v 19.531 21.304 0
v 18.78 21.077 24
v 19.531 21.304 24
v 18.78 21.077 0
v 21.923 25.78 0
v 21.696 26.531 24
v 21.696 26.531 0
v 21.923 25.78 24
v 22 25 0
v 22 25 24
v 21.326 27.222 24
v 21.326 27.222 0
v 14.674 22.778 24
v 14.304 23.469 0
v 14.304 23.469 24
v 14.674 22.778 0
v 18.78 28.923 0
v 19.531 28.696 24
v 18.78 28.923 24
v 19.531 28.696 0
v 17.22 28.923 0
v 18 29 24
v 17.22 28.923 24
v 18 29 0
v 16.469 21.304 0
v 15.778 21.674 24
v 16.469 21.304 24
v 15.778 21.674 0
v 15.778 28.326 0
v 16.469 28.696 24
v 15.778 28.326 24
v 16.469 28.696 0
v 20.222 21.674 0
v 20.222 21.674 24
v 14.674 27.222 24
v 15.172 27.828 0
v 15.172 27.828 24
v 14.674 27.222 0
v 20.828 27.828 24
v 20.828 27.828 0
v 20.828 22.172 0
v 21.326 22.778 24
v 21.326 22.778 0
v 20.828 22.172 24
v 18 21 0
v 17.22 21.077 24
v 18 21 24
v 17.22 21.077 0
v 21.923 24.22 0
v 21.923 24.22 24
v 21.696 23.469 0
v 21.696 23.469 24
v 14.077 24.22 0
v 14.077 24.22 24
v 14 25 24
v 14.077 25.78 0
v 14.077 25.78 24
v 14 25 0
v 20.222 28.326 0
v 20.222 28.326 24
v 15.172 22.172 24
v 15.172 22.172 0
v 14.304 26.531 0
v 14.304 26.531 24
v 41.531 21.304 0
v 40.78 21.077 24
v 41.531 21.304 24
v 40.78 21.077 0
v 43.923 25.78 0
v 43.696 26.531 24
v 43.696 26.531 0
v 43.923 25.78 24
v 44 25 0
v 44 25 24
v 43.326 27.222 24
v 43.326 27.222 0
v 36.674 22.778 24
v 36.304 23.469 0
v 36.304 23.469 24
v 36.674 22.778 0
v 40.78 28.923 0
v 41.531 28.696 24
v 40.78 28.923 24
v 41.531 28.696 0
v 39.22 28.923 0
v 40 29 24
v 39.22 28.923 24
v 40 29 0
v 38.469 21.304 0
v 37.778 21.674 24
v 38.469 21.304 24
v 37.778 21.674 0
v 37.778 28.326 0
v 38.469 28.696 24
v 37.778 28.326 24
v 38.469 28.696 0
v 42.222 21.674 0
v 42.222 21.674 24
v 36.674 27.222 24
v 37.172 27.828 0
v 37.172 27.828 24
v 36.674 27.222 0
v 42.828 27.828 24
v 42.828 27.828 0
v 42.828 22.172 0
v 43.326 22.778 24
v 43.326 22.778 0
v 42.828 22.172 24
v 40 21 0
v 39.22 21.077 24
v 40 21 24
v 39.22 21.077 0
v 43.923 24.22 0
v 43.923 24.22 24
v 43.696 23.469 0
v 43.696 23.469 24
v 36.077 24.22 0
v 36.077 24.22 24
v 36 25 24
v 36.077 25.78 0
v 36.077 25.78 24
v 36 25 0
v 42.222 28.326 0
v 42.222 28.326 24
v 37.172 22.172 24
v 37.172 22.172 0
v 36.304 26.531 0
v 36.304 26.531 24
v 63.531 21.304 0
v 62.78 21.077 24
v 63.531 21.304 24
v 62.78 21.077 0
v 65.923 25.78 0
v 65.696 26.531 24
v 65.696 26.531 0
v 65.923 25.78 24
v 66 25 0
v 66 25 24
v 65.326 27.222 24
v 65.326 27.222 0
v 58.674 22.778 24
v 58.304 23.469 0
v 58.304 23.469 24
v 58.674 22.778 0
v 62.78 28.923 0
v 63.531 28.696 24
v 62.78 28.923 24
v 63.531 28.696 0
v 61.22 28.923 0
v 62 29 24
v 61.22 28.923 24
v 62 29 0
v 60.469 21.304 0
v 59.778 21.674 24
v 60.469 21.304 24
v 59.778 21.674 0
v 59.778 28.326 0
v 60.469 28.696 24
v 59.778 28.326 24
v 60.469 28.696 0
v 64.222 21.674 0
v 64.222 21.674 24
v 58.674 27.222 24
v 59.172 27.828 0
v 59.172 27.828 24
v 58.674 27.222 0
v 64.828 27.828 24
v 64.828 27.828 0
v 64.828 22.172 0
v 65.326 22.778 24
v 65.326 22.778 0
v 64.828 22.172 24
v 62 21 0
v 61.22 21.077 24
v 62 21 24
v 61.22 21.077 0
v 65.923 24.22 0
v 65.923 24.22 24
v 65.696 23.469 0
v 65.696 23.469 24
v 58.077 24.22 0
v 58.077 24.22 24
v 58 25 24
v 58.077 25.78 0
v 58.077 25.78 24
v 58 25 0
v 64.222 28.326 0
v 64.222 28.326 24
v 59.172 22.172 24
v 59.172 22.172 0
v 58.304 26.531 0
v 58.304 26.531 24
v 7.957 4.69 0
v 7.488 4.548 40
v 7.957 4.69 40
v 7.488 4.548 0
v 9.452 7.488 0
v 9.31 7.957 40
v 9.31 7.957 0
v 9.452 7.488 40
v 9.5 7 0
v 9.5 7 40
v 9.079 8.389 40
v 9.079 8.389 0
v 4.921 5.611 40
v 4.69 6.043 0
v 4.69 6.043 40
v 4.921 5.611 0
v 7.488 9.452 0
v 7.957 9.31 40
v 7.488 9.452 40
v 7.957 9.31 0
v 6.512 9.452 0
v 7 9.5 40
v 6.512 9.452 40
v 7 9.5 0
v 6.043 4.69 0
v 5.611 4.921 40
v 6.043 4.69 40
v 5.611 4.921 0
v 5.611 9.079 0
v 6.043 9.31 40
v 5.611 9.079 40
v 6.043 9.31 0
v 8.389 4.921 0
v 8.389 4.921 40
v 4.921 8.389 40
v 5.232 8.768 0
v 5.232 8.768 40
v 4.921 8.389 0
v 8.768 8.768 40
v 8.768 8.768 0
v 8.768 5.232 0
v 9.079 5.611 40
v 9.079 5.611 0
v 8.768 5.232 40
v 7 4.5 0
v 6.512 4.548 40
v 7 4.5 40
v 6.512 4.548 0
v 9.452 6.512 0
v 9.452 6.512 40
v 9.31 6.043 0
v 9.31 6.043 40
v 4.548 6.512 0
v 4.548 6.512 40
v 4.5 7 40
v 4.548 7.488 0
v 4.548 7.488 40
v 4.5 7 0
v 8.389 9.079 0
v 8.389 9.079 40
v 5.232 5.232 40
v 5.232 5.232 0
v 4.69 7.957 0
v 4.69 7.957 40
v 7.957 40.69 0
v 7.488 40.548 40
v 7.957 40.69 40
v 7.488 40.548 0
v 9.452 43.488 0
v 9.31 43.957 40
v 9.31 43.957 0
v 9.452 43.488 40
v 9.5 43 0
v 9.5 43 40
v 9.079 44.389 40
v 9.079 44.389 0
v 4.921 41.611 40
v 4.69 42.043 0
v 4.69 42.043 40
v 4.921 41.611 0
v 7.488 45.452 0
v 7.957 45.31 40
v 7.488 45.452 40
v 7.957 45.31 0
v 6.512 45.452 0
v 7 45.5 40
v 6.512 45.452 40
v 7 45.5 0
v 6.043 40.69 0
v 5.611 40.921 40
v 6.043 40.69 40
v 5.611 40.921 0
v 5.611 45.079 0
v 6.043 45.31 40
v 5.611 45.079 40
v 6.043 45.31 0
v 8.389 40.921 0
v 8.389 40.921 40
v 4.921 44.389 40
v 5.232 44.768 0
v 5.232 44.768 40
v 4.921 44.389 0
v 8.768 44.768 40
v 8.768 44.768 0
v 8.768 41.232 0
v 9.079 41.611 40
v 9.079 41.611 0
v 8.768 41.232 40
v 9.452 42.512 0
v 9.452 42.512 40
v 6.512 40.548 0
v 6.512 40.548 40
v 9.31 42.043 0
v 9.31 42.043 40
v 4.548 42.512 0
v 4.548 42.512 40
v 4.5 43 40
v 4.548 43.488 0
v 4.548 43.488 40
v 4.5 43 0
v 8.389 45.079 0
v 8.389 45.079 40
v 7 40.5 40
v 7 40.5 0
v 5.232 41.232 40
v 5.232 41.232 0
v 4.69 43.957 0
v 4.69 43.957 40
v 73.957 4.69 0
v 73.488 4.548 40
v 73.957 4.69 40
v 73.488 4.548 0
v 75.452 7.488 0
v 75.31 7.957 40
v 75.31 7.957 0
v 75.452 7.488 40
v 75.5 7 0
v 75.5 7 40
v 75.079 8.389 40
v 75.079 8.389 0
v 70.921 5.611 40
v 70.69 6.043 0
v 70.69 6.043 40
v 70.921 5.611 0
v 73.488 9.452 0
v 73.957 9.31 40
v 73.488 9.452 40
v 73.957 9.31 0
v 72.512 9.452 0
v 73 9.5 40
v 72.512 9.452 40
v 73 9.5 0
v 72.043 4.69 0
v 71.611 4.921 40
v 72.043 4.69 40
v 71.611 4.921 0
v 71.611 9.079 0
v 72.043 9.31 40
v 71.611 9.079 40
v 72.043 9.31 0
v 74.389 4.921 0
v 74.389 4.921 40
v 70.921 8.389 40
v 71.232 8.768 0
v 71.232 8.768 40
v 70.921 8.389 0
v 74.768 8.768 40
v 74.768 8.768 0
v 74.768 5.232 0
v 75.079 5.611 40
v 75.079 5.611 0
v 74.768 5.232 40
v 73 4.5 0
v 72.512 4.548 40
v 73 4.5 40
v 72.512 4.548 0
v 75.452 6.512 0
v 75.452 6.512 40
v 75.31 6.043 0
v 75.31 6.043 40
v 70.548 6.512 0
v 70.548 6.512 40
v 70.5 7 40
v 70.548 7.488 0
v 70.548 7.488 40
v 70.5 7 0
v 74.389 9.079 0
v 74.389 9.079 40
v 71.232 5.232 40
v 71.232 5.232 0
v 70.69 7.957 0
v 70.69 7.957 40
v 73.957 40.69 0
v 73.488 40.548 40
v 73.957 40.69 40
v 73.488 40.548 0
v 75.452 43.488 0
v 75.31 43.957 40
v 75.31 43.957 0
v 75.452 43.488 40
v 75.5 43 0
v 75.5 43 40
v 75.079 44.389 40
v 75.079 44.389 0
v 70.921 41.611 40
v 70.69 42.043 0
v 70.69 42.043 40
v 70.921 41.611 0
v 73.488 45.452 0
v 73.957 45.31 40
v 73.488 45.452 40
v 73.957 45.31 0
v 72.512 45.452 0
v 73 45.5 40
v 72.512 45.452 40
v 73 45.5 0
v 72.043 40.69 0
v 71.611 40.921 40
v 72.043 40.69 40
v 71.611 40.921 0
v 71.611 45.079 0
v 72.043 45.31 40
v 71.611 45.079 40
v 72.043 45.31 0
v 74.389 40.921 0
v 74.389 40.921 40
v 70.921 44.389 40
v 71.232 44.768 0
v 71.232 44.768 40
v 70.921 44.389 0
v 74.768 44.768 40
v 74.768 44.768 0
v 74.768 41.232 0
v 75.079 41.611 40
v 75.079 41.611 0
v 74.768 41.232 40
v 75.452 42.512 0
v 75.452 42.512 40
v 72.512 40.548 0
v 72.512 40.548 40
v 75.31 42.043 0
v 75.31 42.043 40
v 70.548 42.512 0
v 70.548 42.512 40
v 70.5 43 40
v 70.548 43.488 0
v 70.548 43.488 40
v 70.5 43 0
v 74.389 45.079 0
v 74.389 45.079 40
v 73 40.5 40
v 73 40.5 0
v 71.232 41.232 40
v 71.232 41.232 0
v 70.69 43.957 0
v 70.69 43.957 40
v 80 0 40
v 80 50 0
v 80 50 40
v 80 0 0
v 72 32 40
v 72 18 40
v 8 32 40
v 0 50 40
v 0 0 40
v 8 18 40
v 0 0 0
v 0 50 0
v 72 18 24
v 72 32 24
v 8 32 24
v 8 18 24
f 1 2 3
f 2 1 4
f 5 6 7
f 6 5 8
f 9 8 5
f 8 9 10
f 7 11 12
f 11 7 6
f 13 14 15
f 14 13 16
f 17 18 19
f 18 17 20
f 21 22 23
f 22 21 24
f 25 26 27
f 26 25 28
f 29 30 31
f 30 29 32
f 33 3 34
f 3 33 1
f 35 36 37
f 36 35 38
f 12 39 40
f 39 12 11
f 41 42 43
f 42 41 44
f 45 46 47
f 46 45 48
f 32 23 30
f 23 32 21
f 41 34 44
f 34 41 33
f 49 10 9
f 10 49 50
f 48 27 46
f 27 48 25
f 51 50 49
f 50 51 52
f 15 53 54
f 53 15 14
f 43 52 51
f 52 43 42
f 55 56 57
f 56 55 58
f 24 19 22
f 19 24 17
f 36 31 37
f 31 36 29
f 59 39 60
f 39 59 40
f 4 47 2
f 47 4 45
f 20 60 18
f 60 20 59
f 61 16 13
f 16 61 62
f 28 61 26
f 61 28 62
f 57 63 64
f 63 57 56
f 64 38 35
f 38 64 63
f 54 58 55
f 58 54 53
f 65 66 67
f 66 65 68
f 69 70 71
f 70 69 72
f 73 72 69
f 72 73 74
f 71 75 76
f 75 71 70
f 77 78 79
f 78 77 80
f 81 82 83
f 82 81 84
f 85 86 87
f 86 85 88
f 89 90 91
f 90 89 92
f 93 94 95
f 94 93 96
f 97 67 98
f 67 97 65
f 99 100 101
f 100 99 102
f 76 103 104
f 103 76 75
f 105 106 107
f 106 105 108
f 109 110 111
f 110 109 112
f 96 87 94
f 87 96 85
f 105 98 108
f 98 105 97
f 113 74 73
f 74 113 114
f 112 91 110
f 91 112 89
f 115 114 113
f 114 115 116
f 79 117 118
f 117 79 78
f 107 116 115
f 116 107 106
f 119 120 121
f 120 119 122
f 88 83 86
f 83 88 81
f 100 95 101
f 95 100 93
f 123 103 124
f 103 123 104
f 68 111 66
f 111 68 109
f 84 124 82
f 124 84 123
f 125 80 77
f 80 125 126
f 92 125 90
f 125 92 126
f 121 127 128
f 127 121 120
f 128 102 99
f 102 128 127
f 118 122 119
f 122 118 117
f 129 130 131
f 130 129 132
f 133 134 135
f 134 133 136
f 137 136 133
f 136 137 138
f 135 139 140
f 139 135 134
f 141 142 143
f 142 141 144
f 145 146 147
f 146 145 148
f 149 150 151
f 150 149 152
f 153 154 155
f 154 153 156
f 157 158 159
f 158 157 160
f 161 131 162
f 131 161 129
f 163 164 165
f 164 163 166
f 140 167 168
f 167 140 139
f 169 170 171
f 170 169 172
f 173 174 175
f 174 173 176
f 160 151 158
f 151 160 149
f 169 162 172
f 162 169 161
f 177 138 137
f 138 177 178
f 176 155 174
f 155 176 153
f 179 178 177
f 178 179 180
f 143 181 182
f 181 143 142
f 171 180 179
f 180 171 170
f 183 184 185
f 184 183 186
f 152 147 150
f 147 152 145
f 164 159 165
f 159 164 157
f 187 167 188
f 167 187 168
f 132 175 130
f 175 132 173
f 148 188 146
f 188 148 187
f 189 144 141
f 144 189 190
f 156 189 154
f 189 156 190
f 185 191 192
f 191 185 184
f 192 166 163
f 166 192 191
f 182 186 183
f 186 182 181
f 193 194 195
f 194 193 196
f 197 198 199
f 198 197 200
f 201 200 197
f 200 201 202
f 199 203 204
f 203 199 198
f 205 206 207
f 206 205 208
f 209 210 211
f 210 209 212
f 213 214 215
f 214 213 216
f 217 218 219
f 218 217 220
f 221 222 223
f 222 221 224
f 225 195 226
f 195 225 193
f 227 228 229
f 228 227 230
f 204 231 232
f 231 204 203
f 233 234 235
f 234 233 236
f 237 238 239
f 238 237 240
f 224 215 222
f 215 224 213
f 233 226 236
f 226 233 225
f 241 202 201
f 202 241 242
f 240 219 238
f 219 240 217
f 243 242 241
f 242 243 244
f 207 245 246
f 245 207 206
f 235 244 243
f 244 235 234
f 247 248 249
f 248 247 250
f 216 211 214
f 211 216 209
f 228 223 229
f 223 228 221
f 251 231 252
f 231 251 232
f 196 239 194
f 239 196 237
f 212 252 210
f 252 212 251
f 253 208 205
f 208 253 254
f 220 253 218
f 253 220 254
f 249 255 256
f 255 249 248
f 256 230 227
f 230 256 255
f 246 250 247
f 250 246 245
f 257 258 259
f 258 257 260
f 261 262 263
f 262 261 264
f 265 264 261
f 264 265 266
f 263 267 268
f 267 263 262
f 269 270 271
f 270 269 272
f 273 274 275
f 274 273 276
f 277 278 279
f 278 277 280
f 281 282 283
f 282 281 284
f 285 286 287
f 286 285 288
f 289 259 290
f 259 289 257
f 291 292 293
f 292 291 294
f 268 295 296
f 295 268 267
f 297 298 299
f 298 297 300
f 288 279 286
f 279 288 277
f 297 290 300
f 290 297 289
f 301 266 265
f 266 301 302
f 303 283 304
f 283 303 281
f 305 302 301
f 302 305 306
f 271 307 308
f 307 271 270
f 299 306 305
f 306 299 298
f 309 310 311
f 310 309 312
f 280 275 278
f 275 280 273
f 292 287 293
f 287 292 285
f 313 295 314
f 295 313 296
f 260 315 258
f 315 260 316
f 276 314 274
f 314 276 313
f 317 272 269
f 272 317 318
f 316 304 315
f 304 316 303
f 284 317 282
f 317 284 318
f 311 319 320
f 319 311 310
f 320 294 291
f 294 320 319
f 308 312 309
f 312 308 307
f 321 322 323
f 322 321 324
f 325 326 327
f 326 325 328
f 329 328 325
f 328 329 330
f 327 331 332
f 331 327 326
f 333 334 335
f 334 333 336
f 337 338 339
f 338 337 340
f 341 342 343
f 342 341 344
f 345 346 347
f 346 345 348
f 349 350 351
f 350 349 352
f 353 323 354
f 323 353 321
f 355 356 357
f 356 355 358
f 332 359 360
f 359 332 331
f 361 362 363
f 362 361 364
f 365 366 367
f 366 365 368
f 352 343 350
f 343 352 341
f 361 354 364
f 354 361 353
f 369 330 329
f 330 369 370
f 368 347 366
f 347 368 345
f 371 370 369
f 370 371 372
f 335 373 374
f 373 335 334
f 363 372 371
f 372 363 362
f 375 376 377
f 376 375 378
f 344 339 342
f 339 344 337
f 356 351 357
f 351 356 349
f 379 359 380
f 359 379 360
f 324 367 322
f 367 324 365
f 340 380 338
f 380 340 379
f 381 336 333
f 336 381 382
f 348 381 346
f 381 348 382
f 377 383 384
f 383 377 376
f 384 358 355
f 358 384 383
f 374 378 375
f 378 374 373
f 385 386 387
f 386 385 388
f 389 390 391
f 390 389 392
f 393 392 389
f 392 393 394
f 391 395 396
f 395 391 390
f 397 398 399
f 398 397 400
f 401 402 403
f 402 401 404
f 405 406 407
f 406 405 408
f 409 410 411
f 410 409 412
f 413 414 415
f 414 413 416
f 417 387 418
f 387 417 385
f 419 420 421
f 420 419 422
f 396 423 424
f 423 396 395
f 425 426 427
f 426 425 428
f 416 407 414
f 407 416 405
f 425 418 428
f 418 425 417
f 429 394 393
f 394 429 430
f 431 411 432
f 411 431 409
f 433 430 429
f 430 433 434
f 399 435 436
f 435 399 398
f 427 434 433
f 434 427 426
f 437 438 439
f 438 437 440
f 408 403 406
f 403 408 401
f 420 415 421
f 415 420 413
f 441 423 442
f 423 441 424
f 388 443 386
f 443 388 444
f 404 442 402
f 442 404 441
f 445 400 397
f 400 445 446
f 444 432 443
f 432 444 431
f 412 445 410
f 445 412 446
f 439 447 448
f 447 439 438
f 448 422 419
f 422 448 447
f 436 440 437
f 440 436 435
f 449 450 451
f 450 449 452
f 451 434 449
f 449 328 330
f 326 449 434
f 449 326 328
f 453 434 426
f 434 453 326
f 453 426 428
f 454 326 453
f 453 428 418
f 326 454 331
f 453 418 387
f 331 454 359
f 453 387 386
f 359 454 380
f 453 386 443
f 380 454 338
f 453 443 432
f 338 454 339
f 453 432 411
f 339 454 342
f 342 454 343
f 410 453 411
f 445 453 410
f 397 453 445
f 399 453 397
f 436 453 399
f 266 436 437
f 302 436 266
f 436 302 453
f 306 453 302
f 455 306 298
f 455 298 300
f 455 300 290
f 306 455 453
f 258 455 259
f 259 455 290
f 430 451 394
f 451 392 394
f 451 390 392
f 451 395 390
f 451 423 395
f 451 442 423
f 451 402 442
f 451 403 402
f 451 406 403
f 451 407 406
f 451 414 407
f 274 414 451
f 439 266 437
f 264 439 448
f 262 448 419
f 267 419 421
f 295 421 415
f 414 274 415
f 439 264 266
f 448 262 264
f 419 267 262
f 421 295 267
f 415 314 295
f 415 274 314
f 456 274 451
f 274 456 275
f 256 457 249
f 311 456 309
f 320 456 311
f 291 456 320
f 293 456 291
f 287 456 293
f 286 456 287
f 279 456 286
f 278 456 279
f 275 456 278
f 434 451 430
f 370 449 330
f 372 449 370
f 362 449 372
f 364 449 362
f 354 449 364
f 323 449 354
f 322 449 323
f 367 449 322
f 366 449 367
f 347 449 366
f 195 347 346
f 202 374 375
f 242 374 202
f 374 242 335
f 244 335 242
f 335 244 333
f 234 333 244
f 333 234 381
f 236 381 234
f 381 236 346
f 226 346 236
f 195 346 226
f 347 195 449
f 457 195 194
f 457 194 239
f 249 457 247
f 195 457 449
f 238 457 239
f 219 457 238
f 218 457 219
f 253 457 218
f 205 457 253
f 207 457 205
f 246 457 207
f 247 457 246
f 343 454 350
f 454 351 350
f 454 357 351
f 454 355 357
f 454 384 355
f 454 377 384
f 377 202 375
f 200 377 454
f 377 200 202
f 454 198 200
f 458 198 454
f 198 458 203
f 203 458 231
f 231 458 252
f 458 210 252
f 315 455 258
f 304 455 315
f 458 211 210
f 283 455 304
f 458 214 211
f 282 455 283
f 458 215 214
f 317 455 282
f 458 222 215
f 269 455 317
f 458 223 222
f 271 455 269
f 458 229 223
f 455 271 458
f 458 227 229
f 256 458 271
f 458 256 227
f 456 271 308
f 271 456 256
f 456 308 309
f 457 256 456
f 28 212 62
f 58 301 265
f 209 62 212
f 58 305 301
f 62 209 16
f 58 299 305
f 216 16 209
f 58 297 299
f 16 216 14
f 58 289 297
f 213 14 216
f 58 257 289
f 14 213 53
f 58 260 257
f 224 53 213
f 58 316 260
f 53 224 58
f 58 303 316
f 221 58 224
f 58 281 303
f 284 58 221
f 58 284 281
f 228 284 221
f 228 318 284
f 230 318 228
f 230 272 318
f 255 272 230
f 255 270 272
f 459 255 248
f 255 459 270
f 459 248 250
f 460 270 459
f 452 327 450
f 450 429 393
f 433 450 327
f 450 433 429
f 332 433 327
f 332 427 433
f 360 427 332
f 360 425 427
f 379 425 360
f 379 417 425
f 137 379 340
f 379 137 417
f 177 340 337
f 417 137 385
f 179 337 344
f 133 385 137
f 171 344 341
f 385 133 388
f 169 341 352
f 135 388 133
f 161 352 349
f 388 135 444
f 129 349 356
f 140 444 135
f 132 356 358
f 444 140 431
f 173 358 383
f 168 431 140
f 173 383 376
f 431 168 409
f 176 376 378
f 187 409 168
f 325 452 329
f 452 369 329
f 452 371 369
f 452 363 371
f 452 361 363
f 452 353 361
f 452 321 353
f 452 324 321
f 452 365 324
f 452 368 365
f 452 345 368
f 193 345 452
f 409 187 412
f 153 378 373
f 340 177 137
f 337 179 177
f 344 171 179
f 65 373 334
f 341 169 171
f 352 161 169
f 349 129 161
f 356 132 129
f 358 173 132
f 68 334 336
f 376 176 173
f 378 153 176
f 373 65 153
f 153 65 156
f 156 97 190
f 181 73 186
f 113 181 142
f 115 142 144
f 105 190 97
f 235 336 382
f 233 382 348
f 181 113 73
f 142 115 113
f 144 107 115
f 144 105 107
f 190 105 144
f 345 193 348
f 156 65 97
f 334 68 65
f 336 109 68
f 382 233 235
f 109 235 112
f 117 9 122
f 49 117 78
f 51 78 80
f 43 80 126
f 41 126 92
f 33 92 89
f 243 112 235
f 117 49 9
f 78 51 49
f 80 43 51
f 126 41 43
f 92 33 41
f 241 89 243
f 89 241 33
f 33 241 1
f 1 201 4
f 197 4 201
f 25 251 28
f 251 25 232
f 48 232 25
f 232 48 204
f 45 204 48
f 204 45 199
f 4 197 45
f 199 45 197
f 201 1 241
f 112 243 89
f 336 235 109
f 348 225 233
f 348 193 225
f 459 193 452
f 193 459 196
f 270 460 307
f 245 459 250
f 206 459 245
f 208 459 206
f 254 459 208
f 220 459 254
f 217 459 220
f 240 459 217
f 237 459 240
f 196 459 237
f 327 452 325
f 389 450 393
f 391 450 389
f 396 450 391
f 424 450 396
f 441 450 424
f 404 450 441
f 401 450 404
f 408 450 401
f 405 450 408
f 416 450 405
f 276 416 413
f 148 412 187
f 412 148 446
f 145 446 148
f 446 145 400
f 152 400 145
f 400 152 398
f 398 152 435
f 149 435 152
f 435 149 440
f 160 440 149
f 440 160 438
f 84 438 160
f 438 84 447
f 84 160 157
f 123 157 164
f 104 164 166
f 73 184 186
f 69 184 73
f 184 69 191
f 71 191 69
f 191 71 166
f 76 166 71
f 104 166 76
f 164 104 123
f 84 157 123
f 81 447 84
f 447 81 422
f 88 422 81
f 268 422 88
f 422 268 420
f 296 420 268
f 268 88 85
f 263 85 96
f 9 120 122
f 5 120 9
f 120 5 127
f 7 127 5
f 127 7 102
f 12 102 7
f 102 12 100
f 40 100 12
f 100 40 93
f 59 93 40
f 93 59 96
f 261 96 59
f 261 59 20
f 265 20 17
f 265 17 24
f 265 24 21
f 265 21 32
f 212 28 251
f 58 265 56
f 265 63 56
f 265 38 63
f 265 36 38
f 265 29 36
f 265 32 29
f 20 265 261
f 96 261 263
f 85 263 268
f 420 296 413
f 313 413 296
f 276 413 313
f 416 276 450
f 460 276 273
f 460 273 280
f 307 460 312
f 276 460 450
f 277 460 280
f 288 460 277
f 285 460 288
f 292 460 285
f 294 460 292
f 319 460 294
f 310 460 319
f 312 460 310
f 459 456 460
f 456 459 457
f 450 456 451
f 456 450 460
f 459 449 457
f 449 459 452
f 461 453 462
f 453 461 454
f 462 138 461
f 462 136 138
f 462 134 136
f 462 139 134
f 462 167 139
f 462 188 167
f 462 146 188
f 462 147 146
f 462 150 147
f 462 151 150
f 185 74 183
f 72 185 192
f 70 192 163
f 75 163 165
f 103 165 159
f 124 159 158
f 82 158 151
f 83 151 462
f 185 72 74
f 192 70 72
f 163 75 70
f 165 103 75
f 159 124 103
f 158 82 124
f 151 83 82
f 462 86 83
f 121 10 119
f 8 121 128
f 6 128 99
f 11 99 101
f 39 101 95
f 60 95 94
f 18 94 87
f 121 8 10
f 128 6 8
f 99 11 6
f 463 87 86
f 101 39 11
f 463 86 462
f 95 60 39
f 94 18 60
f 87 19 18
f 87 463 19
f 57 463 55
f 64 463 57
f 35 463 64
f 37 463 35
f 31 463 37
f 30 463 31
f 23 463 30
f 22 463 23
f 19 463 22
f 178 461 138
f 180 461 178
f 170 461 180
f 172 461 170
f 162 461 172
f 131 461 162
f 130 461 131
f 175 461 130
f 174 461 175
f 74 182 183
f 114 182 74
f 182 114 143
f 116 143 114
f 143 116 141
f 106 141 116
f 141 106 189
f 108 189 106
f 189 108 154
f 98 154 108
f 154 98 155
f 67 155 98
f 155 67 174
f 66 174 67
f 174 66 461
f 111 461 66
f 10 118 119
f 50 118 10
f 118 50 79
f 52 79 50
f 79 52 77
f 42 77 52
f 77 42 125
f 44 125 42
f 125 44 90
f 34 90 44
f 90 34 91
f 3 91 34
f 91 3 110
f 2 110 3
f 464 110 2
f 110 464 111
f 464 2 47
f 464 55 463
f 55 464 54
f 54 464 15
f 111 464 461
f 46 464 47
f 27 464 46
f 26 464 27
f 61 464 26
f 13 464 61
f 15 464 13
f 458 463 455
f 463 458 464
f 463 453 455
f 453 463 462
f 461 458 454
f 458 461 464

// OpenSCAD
$fn = 32;

// ----------------------------------------------------------------------
// Manifold block: gallery_top manifold
// ----------------------------------------------------------------------

// --- parameters (mm) ---
block_l = 80;             // block length, X
block_w = 50;             // block width, Y
block_h = 40;             // block height, Z
port_d = 8;               // port bore diameter
port_pitch = 22;          // port pitch along X
gallery_d = 14;           // top gallery width, Y
gallery_depth = 16;       // gallery pocket depth
wall_p = 8;               // gallery end wall thickness, X
mnt_d = 5;                // mounting hole diameter
mnt_in = 7;               // mounting hole inset from the edges

n_ports = 3;  // ports in the row
port_x0 = (block_l - (n_ports - 1) * port_pitch) / 2;  // first port X

difference() {
  cube([block_l, block_w, block_h]);
  for (i = [0 : n_ports - 1])
    translate([port_x0 + i * port_pitch, block_w / 2, -1])
      cylinder(h = block_h + 2, d = port_d);
  translate([wall_p, block_w / 2 - gallery_d / 2, block_h - gallery_depth])
    cube([block_l - 2 * wall_p, gallery_d, gallery_depth + 1]);
  for (cx = [mnt_in, block_l - mnt_in])
    for (cy = [mnt_in, block_w - mnt_in])
      translate([cx, cy, -1]) cylinder(h = block_h + 2, d = mnt_d);
}
